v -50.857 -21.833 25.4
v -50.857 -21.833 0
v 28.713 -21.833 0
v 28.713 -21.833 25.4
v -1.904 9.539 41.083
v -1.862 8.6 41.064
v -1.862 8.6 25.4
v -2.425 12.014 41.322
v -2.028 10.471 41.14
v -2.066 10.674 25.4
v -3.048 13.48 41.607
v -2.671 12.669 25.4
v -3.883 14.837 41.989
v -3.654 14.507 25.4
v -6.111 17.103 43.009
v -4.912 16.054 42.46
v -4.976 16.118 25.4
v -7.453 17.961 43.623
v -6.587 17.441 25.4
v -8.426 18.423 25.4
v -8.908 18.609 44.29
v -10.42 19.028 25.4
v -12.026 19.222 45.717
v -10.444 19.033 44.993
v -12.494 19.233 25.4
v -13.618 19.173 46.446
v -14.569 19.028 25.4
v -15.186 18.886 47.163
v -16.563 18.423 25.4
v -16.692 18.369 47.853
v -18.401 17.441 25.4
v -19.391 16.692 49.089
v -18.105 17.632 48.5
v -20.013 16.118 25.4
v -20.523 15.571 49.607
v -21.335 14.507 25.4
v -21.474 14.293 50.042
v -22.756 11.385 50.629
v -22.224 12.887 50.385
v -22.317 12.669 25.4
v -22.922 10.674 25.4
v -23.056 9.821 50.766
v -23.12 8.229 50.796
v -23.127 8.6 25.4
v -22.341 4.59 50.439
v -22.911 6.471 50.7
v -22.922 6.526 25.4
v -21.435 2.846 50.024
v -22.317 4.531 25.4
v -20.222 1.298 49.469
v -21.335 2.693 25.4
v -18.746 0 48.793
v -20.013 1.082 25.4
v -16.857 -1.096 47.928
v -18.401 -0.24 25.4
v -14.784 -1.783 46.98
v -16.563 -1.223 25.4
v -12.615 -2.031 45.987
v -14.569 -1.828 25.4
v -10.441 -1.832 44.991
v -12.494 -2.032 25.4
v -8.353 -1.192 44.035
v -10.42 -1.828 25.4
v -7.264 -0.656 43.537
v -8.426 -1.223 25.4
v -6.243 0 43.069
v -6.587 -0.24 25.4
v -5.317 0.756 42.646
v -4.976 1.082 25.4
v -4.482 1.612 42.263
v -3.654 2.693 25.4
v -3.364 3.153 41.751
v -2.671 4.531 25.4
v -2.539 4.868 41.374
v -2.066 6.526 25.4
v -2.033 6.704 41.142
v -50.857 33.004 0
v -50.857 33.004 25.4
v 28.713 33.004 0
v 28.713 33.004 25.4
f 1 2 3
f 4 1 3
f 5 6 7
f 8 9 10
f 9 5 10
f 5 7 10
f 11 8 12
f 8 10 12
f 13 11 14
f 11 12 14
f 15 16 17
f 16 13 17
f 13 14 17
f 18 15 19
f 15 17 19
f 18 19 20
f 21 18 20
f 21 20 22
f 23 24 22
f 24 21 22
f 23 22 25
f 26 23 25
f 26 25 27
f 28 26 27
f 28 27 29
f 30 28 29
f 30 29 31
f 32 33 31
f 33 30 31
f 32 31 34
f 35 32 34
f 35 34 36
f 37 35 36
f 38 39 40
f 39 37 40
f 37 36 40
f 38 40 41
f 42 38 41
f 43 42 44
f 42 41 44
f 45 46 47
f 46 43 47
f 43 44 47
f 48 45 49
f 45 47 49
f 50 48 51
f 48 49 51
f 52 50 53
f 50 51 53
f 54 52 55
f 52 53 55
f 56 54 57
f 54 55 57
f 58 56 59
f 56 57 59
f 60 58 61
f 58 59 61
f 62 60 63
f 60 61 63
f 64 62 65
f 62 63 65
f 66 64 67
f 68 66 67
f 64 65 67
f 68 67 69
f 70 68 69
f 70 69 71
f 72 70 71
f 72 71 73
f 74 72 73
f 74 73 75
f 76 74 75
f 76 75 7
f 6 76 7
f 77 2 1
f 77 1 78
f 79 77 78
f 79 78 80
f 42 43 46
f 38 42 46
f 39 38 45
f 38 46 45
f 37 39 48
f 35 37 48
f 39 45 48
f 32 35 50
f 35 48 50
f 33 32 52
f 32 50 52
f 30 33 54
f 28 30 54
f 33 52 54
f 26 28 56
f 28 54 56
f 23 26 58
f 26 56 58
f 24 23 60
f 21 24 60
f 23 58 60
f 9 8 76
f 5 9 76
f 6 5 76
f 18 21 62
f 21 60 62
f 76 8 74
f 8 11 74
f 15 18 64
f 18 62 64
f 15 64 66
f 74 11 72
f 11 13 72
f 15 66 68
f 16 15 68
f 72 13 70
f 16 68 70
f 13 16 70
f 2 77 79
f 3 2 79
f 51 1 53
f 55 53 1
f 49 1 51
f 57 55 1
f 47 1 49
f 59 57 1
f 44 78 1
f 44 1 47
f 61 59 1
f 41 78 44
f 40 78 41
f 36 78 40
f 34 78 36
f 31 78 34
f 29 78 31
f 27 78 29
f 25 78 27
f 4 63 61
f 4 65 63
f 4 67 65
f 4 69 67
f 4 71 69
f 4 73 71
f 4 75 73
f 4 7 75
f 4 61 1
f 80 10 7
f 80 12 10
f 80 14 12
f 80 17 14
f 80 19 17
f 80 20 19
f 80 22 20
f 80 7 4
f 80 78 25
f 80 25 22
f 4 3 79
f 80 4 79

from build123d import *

# Parameters (mm, degrees)
F0_W          = 79.5706696808
F0_H          = 54.8370443285
F1_DEPTH      = 25.4
F2_R          = 10.632312462
F3_DEPTH      = 25.4
F5_DEPTH      = 27.178
F5_DEPTH_BACK = 32.766


with BuildPart() as f1:
    # F0 (on Top) → F1 (new body)
    with BuildSketch(Plane.XY):
        with Locations((-11.0720153898, 5.5851843208)):
            Rectangle(F0_W, F0_H)
    extrude(amount=F1_DEPTH)

    # F2 (on face) → F3 (join)
    with BuildSketch(Plane.XY.offset(25.4)):
        with Locations((-12.4944150448, 8.600234054)):
            Circle(F2_R)
    extrude(amount=F3_DEPTH)

    # F4 (on Front) → F5 (cut, two sides)
    with BuildSketch(Plane.XZ) as f5_sk:
        Polygon((-1.411169651, 50.8574359119), (-23.2553649694, 50.8574359119), (-1.411169651, 40.8576503396), align=None)
    extrude(amount=-F5_DEPTH, mode=Mode.SUBTRACT)
    extrude(f5_sk.sketch, amount=F5_DEPTH_BACK, mode=Mode.SUBTRACT)


solid = f1.part
